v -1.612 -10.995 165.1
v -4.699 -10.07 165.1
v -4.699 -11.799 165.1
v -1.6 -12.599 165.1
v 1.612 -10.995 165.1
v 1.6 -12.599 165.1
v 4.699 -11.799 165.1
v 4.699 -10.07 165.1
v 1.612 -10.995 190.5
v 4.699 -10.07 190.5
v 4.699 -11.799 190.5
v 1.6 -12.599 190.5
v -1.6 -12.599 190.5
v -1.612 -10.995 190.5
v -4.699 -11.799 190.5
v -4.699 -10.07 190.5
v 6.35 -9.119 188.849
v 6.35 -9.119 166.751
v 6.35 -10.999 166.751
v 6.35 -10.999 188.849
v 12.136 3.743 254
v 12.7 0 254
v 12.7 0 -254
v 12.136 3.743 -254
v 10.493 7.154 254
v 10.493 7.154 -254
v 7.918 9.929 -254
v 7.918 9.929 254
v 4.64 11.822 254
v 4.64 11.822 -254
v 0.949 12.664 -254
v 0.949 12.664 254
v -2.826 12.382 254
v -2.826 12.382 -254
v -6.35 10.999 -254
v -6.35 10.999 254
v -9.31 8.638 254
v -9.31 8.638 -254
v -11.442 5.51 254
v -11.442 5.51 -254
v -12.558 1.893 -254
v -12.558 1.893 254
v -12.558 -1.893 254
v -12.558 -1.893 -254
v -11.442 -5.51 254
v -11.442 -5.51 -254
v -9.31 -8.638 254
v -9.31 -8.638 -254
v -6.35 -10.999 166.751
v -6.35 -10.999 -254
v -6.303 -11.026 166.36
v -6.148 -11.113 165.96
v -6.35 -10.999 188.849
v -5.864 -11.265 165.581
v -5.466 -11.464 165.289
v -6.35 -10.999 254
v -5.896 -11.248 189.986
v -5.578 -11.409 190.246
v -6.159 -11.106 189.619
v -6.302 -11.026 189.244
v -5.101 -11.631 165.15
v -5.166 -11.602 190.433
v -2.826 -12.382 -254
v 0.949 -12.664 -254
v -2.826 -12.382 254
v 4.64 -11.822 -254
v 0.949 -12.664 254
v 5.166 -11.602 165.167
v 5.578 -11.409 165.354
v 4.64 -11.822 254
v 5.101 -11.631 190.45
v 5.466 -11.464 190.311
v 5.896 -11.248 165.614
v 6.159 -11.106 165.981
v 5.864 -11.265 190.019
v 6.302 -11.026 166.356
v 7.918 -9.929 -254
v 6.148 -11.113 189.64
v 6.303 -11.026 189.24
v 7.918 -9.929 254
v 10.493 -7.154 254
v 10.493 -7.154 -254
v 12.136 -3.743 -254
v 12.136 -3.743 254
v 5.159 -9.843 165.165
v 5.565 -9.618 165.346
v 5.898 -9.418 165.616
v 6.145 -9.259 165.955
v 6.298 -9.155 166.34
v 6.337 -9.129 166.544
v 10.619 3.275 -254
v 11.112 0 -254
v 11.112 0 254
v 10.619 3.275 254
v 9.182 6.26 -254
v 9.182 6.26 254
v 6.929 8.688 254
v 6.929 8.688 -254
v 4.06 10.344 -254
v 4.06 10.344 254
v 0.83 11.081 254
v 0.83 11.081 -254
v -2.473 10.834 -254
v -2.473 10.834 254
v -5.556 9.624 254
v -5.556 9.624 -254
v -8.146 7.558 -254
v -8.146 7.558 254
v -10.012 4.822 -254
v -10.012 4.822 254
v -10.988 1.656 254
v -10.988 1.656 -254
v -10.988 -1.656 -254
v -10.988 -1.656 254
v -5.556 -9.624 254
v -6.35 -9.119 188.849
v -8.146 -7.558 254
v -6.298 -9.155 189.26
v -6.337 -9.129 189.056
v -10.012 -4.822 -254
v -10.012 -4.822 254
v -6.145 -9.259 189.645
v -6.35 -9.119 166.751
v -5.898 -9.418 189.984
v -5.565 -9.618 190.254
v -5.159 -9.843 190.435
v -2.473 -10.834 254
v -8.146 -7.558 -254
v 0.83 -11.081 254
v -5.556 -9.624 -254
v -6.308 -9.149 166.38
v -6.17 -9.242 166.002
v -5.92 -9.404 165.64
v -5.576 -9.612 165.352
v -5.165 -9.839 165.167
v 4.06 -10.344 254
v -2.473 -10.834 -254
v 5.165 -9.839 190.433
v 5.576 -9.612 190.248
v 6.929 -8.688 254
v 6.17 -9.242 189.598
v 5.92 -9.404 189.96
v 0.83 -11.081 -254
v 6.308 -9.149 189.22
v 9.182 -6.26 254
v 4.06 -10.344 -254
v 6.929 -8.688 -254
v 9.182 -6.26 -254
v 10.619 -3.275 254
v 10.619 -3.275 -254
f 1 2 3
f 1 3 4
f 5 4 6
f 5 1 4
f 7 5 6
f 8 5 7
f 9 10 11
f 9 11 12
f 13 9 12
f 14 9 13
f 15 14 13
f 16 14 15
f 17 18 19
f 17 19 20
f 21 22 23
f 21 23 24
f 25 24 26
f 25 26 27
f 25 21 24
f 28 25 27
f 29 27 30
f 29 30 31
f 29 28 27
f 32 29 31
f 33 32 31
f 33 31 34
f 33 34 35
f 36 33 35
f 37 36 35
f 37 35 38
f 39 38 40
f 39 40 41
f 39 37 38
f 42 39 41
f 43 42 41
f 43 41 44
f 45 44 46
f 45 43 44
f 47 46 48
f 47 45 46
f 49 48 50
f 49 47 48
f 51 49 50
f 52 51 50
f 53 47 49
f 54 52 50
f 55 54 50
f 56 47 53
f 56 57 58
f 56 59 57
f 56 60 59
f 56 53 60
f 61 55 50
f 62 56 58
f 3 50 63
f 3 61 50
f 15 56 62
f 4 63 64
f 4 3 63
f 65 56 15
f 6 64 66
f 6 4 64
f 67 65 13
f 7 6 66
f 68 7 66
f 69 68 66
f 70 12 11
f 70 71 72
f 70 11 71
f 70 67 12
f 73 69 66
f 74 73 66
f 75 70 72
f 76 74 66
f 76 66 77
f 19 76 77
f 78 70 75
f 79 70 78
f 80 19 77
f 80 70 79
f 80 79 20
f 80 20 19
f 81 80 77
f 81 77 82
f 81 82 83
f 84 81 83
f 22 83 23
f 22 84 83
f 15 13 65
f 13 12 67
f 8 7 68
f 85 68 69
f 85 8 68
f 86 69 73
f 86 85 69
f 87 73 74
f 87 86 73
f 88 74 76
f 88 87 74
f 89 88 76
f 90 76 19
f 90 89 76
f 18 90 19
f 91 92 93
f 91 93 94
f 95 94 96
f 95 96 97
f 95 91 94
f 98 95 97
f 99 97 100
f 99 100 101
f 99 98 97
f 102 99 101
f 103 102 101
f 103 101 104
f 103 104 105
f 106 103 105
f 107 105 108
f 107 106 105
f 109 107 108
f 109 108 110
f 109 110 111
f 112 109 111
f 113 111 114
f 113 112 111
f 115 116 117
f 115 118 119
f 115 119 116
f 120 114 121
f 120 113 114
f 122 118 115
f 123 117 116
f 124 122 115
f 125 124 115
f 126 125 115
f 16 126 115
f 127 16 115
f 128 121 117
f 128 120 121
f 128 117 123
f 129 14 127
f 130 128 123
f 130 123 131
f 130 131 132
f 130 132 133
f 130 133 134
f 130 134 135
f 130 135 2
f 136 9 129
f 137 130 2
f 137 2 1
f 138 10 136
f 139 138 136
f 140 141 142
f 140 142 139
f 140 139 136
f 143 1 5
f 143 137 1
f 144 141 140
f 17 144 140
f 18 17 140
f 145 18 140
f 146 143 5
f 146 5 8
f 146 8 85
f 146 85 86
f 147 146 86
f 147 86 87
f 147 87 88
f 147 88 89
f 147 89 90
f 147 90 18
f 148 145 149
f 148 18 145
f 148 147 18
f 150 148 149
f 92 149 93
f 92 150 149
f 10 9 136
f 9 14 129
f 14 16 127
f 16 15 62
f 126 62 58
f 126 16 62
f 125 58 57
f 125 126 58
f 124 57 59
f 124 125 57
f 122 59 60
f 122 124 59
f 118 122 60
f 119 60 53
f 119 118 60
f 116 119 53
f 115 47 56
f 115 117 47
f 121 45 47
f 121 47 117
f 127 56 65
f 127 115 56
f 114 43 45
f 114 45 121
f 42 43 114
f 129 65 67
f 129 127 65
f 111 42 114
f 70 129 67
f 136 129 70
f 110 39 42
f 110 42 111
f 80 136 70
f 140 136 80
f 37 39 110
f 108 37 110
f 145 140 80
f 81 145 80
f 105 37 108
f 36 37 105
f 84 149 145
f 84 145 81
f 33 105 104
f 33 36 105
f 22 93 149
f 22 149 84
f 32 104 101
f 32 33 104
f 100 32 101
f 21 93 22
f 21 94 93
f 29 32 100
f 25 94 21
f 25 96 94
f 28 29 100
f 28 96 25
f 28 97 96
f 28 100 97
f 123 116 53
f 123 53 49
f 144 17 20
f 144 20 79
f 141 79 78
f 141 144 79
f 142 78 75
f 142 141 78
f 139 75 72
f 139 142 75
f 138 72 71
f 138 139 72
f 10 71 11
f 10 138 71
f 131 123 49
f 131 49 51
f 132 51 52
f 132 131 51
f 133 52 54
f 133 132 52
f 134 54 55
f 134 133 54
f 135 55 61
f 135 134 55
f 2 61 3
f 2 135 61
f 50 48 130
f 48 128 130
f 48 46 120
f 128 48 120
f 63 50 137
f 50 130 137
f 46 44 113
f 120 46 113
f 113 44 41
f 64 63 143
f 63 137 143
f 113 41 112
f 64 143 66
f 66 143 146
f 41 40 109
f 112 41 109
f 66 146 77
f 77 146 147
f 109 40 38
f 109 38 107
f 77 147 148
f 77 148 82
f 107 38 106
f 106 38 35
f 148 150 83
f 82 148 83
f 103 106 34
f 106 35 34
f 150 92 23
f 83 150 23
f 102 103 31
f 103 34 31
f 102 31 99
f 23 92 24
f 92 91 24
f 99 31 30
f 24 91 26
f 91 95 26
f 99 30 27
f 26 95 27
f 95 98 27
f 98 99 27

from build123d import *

# Parameters (mm, degrees)
F0_R     = 12.7
F0_R_2   = 11.1125
F1_DEPTH = 254
F3_DEPTH = 25.4


with BuildPart() as f1:
    # F0 (on Top) → F1 (new body, symmetric)
    with BuildSketch(Plane.XY):
        Circle(F0_R)
        Circle(F0_R_2, mode=Mode.SUBTRACT)
    extrude(amount=F1_DEPTH, both=True)

    # F2 (on Front) → F3 (cut)
    with BuildSketch(Plane.XZ):
        with BuildLine():
            Line((4.699, 190.5), (-4.699, 190.5))
            ThreePointArc((-4.699, 190.5), (-5.866433, 190.016433), (-6.35, 188.849))
            Line((-6.35, 188.849), (-6.35, 166.751))
            ThreePointArc((-6.35, 166.751), (-5.866433, 165.583567), (-4.699, 165.1))
            Line((-4.699, 165.1), (4.699, 165.1))
            ThreePointArc((4.699, 165.1), (5.866433, 165.583567), (6.35, 166.751))
            Line((6.35, 166.751), (6.35, 188.849))
            ThreePointArc((6.35, 188.849), (5.866433, 190.016433), (4.699, 190.5))
        make_face()
    extrude(amount=F3_DEPTH, mode=Mode.SUBTRACT)


solid = f1.part
